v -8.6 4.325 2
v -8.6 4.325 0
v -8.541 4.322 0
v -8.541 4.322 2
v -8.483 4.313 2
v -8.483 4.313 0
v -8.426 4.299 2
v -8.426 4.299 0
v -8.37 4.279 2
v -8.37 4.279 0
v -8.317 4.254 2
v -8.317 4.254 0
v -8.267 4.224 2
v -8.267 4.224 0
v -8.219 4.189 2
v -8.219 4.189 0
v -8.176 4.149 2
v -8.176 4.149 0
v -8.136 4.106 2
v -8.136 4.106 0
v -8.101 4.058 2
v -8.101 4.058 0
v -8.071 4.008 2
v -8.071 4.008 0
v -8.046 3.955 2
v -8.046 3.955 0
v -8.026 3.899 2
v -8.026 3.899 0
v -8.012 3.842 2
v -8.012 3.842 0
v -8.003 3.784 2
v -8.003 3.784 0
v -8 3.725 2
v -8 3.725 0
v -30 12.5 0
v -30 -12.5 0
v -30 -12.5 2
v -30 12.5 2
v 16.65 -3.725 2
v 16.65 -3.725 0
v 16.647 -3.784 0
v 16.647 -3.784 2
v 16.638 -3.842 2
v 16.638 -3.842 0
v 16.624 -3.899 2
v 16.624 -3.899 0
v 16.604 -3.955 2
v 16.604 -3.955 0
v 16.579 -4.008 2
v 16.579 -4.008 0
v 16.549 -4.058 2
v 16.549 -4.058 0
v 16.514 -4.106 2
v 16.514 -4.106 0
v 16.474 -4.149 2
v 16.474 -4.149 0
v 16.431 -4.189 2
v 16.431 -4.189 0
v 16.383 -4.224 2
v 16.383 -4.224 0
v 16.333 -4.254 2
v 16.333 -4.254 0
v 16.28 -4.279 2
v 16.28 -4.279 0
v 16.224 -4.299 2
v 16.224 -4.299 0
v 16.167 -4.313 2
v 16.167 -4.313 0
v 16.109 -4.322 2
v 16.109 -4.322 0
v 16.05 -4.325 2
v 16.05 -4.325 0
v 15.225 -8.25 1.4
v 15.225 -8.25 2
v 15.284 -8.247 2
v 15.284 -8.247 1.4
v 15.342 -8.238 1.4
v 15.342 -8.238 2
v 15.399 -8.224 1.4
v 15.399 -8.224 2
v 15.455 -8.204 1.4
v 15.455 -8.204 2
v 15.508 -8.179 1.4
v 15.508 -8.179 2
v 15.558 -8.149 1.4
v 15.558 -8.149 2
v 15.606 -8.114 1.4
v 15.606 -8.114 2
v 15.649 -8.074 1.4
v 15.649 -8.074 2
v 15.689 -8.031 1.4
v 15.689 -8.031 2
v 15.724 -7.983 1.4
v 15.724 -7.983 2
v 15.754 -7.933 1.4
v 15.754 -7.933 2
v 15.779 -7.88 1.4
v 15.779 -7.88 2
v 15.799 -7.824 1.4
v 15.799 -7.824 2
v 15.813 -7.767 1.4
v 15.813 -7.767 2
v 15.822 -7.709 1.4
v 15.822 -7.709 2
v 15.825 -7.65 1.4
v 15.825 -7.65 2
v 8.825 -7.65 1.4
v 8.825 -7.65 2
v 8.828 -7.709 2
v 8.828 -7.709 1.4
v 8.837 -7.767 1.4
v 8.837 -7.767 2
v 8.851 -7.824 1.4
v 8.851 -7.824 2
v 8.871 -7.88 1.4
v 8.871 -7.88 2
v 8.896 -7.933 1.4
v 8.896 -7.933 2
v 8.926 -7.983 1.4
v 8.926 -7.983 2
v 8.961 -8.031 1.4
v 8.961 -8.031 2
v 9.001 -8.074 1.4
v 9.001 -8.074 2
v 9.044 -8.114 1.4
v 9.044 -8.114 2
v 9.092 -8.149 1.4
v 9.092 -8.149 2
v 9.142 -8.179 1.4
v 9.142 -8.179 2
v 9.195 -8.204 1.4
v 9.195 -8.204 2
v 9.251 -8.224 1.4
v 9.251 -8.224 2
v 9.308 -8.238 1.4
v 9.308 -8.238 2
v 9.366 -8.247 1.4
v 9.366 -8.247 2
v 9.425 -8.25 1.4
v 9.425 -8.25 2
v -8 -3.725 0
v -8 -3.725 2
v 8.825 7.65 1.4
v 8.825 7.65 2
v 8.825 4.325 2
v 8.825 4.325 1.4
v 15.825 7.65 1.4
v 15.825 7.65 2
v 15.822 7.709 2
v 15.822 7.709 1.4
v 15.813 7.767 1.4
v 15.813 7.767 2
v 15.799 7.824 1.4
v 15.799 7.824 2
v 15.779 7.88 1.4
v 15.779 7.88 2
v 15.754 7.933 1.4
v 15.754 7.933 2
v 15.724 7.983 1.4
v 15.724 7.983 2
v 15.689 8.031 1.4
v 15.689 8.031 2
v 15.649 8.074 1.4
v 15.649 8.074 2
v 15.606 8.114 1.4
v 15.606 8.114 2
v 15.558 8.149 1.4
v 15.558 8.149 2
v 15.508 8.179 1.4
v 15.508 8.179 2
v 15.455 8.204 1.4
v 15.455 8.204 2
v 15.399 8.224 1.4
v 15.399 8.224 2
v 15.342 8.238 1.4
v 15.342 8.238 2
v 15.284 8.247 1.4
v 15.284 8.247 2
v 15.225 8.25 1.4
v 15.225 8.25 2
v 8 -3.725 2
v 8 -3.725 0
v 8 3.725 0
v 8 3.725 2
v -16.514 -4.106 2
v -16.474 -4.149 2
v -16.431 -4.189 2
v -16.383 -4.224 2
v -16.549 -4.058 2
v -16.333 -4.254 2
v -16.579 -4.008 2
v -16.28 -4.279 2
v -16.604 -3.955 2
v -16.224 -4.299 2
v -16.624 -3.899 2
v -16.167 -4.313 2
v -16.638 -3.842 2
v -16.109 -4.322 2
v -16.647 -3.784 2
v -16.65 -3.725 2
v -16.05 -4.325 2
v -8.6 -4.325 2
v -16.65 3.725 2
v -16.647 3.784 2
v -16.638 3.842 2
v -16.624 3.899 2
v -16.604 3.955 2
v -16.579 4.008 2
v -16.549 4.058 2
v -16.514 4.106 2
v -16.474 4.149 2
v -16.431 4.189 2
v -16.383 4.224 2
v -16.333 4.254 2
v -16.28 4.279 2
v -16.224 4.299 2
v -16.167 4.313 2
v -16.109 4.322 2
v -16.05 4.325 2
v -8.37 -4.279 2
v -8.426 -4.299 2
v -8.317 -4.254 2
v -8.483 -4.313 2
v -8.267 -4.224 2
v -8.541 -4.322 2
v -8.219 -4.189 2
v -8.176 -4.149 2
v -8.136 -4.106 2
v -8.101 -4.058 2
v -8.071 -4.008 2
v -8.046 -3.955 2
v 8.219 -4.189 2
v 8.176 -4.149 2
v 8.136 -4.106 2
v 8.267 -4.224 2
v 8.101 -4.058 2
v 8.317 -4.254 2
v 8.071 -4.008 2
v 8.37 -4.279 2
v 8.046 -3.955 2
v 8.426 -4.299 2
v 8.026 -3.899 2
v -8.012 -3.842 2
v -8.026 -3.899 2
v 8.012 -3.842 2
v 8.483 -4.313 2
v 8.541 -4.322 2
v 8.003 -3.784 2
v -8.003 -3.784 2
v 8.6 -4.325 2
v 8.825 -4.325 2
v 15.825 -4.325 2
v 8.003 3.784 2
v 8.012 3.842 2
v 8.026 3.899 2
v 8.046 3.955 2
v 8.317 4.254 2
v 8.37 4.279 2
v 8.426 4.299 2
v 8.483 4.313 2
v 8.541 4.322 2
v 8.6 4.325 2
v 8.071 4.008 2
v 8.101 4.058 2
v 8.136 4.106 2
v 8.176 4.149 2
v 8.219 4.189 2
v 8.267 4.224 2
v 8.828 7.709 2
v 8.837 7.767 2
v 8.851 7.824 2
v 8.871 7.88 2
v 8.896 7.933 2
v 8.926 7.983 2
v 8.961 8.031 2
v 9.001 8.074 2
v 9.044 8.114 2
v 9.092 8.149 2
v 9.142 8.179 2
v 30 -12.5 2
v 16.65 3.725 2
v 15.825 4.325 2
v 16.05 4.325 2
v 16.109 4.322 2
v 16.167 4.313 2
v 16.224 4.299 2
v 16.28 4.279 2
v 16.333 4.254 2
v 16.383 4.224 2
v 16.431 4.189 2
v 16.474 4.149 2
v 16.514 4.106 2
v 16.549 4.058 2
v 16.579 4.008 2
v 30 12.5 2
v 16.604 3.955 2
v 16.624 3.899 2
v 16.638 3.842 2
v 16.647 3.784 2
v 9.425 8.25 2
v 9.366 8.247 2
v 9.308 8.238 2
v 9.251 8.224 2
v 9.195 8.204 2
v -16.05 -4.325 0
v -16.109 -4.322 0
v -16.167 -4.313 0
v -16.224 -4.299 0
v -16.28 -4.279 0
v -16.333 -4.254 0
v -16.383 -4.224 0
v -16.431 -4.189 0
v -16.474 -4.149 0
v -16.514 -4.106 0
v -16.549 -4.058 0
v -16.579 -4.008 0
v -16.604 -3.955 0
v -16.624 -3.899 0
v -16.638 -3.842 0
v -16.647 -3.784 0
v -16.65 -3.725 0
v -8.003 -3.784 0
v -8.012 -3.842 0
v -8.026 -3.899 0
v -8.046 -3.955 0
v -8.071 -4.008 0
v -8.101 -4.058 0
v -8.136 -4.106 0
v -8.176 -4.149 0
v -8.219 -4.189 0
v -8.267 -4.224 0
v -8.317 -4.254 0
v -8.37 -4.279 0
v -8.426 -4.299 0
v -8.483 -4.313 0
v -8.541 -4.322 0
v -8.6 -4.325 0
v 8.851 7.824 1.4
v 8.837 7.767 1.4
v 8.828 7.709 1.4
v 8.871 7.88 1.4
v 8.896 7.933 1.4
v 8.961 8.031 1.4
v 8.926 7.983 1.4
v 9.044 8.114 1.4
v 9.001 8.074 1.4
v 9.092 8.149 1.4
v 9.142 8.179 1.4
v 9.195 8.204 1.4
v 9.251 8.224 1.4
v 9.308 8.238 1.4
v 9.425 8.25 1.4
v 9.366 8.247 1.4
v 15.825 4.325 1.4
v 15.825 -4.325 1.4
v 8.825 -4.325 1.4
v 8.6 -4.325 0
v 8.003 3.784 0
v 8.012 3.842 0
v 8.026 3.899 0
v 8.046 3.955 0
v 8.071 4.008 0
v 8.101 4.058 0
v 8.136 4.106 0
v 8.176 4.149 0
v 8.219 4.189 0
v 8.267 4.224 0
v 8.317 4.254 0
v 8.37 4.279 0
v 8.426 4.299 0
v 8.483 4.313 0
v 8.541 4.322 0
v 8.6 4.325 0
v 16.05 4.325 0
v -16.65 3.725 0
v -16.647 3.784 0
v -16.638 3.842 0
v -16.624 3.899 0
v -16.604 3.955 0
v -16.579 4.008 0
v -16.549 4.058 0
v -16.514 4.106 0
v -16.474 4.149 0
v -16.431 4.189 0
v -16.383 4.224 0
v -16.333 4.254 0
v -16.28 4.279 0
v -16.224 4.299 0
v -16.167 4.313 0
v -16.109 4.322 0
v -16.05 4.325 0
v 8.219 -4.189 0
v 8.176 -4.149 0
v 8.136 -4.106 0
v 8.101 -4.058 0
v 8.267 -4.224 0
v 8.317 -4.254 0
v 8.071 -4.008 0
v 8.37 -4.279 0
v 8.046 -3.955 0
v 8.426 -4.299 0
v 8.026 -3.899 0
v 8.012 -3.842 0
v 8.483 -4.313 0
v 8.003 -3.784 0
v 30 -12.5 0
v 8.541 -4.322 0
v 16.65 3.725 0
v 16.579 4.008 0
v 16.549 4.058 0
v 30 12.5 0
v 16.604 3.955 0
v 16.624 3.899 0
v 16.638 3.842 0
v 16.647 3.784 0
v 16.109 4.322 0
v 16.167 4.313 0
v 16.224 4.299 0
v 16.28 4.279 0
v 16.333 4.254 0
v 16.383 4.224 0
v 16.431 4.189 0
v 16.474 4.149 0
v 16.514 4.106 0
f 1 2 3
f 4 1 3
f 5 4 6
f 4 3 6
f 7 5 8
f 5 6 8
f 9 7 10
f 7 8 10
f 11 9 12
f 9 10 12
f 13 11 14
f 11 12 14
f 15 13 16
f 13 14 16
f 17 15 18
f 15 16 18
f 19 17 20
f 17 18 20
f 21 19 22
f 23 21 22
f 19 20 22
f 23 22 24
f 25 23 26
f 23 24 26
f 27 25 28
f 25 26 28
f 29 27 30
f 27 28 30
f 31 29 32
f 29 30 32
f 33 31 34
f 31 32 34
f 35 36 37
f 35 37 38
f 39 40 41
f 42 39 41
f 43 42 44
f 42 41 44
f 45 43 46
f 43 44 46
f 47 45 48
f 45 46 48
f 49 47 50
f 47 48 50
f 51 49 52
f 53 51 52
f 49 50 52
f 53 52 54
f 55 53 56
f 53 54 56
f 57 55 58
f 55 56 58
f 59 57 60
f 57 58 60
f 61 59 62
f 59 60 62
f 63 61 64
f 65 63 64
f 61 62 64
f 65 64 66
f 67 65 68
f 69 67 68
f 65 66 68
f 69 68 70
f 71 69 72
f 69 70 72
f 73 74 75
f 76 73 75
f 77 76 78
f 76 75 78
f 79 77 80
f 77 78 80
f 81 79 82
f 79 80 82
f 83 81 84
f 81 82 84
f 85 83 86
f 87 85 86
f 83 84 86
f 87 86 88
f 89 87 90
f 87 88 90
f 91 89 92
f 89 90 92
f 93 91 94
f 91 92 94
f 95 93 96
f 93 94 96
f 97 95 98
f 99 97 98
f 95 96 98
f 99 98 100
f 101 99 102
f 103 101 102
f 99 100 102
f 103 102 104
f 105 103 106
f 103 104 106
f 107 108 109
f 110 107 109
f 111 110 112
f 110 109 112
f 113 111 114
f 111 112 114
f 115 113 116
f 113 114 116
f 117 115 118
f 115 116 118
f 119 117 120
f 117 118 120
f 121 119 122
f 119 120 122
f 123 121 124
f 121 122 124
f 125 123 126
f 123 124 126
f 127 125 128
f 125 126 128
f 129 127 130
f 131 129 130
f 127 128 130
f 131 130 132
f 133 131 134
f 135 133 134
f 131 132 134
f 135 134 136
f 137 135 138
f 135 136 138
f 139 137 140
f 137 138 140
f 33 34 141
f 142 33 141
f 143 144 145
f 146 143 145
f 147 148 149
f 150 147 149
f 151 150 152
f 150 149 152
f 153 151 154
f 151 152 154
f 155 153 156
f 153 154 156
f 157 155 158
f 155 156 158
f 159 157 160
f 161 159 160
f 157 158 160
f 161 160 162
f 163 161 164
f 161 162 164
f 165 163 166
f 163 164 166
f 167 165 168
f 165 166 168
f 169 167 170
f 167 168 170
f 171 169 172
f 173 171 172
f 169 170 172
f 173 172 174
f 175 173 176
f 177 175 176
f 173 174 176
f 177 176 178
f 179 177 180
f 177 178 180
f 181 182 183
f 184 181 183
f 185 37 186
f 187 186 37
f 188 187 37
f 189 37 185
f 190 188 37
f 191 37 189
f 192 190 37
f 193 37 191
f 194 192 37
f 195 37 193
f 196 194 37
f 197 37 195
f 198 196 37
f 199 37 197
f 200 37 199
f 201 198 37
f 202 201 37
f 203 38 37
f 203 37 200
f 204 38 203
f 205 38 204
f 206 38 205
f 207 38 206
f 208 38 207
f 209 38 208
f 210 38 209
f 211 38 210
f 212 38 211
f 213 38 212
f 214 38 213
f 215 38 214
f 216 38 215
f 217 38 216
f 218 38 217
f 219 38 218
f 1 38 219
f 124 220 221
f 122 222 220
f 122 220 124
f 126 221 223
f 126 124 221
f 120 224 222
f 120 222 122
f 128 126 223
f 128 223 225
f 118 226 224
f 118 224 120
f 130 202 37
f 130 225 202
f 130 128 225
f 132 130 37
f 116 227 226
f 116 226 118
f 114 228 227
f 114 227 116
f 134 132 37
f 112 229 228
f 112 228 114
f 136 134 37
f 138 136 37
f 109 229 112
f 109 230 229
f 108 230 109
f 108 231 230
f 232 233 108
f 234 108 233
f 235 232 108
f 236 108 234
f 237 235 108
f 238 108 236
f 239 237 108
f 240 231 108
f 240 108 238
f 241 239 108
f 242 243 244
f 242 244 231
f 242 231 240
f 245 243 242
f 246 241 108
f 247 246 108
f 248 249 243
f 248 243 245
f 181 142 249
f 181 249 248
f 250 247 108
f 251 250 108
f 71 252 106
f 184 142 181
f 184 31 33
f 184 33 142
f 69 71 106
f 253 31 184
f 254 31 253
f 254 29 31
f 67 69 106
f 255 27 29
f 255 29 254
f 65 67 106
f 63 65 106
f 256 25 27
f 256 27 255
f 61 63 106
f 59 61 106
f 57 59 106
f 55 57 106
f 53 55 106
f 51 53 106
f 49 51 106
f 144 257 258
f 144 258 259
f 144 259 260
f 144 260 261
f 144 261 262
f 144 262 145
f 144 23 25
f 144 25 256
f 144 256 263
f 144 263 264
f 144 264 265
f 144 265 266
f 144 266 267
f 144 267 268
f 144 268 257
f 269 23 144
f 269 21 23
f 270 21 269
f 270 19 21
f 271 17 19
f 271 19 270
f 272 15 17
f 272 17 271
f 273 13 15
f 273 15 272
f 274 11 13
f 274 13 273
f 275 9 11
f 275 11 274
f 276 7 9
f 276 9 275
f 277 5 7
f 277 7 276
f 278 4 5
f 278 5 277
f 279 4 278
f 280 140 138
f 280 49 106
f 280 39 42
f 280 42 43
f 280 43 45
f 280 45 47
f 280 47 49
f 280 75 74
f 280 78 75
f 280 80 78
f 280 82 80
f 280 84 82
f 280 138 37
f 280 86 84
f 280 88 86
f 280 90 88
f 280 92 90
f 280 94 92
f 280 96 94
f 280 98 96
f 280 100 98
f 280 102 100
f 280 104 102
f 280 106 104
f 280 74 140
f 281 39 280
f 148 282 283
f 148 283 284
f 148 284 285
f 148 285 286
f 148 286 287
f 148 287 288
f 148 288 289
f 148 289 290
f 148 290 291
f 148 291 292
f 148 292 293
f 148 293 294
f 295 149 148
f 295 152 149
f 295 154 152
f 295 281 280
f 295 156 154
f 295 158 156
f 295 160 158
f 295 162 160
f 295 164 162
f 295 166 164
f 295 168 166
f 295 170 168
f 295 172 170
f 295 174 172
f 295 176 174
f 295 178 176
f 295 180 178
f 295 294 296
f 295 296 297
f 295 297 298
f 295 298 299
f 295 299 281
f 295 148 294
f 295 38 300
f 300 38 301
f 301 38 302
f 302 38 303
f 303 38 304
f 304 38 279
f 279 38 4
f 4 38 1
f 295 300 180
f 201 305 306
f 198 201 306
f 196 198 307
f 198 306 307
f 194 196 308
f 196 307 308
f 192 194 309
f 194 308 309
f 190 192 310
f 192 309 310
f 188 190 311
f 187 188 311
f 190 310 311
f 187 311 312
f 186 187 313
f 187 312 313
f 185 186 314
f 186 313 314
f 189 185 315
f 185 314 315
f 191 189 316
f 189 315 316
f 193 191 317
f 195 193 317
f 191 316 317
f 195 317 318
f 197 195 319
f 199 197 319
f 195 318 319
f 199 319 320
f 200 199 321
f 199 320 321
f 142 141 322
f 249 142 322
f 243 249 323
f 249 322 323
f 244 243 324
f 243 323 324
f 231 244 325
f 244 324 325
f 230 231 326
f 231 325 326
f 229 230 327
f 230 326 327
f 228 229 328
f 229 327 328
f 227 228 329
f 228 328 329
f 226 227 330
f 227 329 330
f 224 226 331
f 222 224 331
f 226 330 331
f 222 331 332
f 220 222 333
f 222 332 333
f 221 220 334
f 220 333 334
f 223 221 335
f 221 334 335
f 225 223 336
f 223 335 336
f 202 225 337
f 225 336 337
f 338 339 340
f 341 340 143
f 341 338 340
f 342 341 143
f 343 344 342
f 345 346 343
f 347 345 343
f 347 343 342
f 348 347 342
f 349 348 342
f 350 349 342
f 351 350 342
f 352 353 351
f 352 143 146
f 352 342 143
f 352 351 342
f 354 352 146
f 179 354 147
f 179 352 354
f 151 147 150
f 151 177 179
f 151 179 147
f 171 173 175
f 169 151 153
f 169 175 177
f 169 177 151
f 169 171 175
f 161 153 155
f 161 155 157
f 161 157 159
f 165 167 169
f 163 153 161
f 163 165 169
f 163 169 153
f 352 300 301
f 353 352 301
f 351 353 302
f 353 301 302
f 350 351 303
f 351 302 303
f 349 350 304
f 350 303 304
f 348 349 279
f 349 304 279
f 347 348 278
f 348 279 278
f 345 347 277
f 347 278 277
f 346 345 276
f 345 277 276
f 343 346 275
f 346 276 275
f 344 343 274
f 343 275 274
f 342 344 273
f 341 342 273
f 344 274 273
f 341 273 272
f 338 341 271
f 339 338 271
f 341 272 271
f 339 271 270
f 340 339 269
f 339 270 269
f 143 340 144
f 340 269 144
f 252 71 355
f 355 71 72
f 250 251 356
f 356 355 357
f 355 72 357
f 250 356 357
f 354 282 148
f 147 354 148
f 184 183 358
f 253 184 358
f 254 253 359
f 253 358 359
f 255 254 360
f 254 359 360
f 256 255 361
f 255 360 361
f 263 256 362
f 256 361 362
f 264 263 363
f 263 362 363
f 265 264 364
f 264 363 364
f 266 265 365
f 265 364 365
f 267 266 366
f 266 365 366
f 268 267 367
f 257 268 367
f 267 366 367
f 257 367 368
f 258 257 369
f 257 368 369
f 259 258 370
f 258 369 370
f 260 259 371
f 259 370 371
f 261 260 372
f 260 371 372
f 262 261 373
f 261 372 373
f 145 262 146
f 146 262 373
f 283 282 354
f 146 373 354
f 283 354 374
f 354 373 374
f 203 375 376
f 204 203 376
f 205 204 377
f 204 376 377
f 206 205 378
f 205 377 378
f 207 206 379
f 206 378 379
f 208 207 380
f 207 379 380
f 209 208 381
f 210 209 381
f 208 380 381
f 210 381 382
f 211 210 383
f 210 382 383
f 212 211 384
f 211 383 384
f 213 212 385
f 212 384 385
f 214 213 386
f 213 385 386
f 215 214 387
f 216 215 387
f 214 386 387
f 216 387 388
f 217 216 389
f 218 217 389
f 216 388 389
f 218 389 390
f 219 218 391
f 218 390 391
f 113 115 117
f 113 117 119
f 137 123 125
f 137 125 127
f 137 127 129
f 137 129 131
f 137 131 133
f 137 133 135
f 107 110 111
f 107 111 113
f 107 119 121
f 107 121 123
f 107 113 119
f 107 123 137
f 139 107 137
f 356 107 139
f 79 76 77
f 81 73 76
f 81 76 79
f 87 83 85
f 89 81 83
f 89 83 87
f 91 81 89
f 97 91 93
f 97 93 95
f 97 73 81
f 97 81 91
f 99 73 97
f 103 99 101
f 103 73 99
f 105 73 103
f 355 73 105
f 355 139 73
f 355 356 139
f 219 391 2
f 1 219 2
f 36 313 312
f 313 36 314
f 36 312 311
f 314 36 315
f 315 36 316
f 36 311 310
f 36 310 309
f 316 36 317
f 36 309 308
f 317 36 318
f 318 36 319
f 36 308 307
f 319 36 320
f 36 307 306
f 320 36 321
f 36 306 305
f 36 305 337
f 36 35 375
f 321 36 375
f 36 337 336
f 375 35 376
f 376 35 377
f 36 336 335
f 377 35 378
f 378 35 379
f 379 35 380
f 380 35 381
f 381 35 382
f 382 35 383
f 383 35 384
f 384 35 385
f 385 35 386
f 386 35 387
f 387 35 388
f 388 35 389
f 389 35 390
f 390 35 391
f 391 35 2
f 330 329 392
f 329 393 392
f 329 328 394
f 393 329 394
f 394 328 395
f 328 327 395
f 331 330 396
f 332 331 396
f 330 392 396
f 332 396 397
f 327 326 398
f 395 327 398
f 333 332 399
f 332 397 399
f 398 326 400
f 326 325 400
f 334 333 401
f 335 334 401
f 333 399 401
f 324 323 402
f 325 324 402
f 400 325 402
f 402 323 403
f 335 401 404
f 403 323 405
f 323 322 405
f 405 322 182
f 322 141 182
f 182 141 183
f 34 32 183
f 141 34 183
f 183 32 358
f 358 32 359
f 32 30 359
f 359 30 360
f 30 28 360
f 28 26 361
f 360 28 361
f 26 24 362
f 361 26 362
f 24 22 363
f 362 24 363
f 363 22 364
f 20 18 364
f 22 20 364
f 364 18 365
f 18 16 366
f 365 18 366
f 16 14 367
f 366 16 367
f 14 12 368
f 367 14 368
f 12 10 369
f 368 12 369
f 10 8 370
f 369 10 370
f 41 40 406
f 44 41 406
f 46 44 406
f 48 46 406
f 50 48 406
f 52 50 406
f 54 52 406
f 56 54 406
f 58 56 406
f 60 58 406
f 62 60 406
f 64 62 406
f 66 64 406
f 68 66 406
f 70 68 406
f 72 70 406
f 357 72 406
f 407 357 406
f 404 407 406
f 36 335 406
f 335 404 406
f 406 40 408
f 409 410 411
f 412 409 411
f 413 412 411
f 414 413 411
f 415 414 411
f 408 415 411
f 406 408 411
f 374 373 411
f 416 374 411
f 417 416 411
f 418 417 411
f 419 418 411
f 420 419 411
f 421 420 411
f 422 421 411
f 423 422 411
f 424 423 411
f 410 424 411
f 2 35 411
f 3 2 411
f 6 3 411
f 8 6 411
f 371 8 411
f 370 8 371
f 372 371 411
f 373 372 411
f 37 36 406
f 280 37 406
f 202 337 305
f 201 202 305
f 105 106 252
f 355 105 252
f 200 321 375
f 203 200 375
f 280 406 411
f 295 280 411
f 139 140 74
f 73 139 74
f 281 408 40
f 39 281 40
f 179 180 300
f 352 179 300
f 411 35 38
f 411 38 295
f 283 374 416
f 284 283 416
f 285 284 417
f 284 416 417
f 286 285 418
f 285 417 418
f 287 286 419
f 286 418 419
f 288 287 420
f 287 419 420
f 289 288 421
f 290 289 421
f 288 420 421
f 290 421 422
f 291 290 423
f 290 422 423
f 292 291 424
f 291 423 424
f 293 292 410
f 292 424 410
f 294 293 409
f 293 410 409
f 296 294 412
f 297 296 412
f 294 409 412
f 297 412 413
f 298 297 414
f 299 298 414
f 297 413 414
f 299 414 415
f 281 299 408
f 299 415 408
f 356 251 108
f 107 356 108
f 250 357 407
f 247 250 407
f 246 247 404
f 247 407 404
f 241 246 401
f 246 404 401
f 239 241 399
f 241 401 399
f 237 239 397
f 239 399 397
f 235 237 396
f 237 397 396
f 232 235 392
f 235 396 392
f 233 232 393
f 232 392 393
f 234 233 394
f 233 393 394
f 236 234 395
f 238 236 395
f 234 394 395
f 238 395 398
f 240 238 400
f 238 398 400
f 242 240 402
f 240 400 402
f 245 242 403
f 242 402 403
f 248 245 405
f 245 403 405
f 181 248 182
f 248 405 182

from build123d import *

# Parameters (mm, degrees)
F0_W     = 60
F0_H     = 25
F1_DEPTH = 2
F3_DEPTH = 0.6


with BuildPart() as f1:
    # F0 (on Top) → F1 (new body)
    with BuildSketch(Plane.XY):
        Rectangle(F0_W, F0_H)
        with BuildLine():
            ThreePointArc((-16.65, 3.725), (-16.474264, 4.149264), (-16.05, 4.325))
            Line((-16.05, 4.325), (-8.6, 4.325))
            ThreePointArc((-8.6, 4.325), (-8.175736, 4.149264), (-8, 3.725))
            Line((-8, 3.725), (-8, -3.725))
            ThreePointArc((-8, -3.725), (-8.175736, -4.149264), (-8.6, -4.325))
            Line((-8.6, -4.325), (-16.05, -4.325))
            ThreePointArc((-16.05, -4.325), (-16.474264, -4.149264), (-16.65, -3.725))
            Line((-16.65, -3.725), (-16.65, 3.725))
        make_face(mode=Mode.SUBTRACT)
        with BuildLine():
            ThreePointArc((8, 3.725), (8.175736, 4.149264), (8.6, 4.325))
            Line((8.6, 4.325), (16.05, 4.325))
            ThreePointArc((16.05, 4.325), (16.474264, 4.149264), (16.65, 3.725))
            Line((16.65, 3.725), (16.65, -3.725))
            ThreePointArc((16.65, -3.725), (16.474264, -4.149264), (16.05, -4.325))
            Line((16.05, -4.325), (8.6, -4.325))
            ThreePointArc((8.6, -4.325), (8.175736, -4.149264), (8, -3.725))
            Line((8, -3.725), (8, 3.725))
        make_face(mode=Mode.SUBTRACT)
    extrude(amount=F1_DEPTH)

    # F2 (on face) → F3 (cut)
    with BuildSketch(Plane.XY.offset(2)):
        with BuildLine():
            Line((15.225, 8.25), (9.425, 8.25))
            ThreePointArc((9.425, 8.25), (9.000736, 8.074264), (8.825, 7.65))
            Line((8.825, 7.65), (8.825, 4.325))
            Line((8.825, 4.325), (15.825, 4.325))
            Line((15.825, 4.325), (15.825, 7.65))
            ThreePointArc((15.825, 7.65), (15.649264, 8.074264), (15.225, 8.25))
        make_face()
        with BuildLine():
            Line((15.825, -4.325), (8.825, -4.325))
            Line((8.825, -4.325), (8.825, -7.65))
            ThreePointArc((8.825, -7.65), (9.000736, -8.074264), (9.425, -8.25))
            Line((9.425, -8.25), (15.225, -8.25))
            ThreePointArc((15.225, -8.25), (15.649264, -8.074264), (15.825, -7.65))
            Line((15.825, -7.65), (15.825, -4.325))
        make_face()
    extrude(amount=-F3_DEPTH, mode=Mode.SUBTRACT)


solid = f1.part
